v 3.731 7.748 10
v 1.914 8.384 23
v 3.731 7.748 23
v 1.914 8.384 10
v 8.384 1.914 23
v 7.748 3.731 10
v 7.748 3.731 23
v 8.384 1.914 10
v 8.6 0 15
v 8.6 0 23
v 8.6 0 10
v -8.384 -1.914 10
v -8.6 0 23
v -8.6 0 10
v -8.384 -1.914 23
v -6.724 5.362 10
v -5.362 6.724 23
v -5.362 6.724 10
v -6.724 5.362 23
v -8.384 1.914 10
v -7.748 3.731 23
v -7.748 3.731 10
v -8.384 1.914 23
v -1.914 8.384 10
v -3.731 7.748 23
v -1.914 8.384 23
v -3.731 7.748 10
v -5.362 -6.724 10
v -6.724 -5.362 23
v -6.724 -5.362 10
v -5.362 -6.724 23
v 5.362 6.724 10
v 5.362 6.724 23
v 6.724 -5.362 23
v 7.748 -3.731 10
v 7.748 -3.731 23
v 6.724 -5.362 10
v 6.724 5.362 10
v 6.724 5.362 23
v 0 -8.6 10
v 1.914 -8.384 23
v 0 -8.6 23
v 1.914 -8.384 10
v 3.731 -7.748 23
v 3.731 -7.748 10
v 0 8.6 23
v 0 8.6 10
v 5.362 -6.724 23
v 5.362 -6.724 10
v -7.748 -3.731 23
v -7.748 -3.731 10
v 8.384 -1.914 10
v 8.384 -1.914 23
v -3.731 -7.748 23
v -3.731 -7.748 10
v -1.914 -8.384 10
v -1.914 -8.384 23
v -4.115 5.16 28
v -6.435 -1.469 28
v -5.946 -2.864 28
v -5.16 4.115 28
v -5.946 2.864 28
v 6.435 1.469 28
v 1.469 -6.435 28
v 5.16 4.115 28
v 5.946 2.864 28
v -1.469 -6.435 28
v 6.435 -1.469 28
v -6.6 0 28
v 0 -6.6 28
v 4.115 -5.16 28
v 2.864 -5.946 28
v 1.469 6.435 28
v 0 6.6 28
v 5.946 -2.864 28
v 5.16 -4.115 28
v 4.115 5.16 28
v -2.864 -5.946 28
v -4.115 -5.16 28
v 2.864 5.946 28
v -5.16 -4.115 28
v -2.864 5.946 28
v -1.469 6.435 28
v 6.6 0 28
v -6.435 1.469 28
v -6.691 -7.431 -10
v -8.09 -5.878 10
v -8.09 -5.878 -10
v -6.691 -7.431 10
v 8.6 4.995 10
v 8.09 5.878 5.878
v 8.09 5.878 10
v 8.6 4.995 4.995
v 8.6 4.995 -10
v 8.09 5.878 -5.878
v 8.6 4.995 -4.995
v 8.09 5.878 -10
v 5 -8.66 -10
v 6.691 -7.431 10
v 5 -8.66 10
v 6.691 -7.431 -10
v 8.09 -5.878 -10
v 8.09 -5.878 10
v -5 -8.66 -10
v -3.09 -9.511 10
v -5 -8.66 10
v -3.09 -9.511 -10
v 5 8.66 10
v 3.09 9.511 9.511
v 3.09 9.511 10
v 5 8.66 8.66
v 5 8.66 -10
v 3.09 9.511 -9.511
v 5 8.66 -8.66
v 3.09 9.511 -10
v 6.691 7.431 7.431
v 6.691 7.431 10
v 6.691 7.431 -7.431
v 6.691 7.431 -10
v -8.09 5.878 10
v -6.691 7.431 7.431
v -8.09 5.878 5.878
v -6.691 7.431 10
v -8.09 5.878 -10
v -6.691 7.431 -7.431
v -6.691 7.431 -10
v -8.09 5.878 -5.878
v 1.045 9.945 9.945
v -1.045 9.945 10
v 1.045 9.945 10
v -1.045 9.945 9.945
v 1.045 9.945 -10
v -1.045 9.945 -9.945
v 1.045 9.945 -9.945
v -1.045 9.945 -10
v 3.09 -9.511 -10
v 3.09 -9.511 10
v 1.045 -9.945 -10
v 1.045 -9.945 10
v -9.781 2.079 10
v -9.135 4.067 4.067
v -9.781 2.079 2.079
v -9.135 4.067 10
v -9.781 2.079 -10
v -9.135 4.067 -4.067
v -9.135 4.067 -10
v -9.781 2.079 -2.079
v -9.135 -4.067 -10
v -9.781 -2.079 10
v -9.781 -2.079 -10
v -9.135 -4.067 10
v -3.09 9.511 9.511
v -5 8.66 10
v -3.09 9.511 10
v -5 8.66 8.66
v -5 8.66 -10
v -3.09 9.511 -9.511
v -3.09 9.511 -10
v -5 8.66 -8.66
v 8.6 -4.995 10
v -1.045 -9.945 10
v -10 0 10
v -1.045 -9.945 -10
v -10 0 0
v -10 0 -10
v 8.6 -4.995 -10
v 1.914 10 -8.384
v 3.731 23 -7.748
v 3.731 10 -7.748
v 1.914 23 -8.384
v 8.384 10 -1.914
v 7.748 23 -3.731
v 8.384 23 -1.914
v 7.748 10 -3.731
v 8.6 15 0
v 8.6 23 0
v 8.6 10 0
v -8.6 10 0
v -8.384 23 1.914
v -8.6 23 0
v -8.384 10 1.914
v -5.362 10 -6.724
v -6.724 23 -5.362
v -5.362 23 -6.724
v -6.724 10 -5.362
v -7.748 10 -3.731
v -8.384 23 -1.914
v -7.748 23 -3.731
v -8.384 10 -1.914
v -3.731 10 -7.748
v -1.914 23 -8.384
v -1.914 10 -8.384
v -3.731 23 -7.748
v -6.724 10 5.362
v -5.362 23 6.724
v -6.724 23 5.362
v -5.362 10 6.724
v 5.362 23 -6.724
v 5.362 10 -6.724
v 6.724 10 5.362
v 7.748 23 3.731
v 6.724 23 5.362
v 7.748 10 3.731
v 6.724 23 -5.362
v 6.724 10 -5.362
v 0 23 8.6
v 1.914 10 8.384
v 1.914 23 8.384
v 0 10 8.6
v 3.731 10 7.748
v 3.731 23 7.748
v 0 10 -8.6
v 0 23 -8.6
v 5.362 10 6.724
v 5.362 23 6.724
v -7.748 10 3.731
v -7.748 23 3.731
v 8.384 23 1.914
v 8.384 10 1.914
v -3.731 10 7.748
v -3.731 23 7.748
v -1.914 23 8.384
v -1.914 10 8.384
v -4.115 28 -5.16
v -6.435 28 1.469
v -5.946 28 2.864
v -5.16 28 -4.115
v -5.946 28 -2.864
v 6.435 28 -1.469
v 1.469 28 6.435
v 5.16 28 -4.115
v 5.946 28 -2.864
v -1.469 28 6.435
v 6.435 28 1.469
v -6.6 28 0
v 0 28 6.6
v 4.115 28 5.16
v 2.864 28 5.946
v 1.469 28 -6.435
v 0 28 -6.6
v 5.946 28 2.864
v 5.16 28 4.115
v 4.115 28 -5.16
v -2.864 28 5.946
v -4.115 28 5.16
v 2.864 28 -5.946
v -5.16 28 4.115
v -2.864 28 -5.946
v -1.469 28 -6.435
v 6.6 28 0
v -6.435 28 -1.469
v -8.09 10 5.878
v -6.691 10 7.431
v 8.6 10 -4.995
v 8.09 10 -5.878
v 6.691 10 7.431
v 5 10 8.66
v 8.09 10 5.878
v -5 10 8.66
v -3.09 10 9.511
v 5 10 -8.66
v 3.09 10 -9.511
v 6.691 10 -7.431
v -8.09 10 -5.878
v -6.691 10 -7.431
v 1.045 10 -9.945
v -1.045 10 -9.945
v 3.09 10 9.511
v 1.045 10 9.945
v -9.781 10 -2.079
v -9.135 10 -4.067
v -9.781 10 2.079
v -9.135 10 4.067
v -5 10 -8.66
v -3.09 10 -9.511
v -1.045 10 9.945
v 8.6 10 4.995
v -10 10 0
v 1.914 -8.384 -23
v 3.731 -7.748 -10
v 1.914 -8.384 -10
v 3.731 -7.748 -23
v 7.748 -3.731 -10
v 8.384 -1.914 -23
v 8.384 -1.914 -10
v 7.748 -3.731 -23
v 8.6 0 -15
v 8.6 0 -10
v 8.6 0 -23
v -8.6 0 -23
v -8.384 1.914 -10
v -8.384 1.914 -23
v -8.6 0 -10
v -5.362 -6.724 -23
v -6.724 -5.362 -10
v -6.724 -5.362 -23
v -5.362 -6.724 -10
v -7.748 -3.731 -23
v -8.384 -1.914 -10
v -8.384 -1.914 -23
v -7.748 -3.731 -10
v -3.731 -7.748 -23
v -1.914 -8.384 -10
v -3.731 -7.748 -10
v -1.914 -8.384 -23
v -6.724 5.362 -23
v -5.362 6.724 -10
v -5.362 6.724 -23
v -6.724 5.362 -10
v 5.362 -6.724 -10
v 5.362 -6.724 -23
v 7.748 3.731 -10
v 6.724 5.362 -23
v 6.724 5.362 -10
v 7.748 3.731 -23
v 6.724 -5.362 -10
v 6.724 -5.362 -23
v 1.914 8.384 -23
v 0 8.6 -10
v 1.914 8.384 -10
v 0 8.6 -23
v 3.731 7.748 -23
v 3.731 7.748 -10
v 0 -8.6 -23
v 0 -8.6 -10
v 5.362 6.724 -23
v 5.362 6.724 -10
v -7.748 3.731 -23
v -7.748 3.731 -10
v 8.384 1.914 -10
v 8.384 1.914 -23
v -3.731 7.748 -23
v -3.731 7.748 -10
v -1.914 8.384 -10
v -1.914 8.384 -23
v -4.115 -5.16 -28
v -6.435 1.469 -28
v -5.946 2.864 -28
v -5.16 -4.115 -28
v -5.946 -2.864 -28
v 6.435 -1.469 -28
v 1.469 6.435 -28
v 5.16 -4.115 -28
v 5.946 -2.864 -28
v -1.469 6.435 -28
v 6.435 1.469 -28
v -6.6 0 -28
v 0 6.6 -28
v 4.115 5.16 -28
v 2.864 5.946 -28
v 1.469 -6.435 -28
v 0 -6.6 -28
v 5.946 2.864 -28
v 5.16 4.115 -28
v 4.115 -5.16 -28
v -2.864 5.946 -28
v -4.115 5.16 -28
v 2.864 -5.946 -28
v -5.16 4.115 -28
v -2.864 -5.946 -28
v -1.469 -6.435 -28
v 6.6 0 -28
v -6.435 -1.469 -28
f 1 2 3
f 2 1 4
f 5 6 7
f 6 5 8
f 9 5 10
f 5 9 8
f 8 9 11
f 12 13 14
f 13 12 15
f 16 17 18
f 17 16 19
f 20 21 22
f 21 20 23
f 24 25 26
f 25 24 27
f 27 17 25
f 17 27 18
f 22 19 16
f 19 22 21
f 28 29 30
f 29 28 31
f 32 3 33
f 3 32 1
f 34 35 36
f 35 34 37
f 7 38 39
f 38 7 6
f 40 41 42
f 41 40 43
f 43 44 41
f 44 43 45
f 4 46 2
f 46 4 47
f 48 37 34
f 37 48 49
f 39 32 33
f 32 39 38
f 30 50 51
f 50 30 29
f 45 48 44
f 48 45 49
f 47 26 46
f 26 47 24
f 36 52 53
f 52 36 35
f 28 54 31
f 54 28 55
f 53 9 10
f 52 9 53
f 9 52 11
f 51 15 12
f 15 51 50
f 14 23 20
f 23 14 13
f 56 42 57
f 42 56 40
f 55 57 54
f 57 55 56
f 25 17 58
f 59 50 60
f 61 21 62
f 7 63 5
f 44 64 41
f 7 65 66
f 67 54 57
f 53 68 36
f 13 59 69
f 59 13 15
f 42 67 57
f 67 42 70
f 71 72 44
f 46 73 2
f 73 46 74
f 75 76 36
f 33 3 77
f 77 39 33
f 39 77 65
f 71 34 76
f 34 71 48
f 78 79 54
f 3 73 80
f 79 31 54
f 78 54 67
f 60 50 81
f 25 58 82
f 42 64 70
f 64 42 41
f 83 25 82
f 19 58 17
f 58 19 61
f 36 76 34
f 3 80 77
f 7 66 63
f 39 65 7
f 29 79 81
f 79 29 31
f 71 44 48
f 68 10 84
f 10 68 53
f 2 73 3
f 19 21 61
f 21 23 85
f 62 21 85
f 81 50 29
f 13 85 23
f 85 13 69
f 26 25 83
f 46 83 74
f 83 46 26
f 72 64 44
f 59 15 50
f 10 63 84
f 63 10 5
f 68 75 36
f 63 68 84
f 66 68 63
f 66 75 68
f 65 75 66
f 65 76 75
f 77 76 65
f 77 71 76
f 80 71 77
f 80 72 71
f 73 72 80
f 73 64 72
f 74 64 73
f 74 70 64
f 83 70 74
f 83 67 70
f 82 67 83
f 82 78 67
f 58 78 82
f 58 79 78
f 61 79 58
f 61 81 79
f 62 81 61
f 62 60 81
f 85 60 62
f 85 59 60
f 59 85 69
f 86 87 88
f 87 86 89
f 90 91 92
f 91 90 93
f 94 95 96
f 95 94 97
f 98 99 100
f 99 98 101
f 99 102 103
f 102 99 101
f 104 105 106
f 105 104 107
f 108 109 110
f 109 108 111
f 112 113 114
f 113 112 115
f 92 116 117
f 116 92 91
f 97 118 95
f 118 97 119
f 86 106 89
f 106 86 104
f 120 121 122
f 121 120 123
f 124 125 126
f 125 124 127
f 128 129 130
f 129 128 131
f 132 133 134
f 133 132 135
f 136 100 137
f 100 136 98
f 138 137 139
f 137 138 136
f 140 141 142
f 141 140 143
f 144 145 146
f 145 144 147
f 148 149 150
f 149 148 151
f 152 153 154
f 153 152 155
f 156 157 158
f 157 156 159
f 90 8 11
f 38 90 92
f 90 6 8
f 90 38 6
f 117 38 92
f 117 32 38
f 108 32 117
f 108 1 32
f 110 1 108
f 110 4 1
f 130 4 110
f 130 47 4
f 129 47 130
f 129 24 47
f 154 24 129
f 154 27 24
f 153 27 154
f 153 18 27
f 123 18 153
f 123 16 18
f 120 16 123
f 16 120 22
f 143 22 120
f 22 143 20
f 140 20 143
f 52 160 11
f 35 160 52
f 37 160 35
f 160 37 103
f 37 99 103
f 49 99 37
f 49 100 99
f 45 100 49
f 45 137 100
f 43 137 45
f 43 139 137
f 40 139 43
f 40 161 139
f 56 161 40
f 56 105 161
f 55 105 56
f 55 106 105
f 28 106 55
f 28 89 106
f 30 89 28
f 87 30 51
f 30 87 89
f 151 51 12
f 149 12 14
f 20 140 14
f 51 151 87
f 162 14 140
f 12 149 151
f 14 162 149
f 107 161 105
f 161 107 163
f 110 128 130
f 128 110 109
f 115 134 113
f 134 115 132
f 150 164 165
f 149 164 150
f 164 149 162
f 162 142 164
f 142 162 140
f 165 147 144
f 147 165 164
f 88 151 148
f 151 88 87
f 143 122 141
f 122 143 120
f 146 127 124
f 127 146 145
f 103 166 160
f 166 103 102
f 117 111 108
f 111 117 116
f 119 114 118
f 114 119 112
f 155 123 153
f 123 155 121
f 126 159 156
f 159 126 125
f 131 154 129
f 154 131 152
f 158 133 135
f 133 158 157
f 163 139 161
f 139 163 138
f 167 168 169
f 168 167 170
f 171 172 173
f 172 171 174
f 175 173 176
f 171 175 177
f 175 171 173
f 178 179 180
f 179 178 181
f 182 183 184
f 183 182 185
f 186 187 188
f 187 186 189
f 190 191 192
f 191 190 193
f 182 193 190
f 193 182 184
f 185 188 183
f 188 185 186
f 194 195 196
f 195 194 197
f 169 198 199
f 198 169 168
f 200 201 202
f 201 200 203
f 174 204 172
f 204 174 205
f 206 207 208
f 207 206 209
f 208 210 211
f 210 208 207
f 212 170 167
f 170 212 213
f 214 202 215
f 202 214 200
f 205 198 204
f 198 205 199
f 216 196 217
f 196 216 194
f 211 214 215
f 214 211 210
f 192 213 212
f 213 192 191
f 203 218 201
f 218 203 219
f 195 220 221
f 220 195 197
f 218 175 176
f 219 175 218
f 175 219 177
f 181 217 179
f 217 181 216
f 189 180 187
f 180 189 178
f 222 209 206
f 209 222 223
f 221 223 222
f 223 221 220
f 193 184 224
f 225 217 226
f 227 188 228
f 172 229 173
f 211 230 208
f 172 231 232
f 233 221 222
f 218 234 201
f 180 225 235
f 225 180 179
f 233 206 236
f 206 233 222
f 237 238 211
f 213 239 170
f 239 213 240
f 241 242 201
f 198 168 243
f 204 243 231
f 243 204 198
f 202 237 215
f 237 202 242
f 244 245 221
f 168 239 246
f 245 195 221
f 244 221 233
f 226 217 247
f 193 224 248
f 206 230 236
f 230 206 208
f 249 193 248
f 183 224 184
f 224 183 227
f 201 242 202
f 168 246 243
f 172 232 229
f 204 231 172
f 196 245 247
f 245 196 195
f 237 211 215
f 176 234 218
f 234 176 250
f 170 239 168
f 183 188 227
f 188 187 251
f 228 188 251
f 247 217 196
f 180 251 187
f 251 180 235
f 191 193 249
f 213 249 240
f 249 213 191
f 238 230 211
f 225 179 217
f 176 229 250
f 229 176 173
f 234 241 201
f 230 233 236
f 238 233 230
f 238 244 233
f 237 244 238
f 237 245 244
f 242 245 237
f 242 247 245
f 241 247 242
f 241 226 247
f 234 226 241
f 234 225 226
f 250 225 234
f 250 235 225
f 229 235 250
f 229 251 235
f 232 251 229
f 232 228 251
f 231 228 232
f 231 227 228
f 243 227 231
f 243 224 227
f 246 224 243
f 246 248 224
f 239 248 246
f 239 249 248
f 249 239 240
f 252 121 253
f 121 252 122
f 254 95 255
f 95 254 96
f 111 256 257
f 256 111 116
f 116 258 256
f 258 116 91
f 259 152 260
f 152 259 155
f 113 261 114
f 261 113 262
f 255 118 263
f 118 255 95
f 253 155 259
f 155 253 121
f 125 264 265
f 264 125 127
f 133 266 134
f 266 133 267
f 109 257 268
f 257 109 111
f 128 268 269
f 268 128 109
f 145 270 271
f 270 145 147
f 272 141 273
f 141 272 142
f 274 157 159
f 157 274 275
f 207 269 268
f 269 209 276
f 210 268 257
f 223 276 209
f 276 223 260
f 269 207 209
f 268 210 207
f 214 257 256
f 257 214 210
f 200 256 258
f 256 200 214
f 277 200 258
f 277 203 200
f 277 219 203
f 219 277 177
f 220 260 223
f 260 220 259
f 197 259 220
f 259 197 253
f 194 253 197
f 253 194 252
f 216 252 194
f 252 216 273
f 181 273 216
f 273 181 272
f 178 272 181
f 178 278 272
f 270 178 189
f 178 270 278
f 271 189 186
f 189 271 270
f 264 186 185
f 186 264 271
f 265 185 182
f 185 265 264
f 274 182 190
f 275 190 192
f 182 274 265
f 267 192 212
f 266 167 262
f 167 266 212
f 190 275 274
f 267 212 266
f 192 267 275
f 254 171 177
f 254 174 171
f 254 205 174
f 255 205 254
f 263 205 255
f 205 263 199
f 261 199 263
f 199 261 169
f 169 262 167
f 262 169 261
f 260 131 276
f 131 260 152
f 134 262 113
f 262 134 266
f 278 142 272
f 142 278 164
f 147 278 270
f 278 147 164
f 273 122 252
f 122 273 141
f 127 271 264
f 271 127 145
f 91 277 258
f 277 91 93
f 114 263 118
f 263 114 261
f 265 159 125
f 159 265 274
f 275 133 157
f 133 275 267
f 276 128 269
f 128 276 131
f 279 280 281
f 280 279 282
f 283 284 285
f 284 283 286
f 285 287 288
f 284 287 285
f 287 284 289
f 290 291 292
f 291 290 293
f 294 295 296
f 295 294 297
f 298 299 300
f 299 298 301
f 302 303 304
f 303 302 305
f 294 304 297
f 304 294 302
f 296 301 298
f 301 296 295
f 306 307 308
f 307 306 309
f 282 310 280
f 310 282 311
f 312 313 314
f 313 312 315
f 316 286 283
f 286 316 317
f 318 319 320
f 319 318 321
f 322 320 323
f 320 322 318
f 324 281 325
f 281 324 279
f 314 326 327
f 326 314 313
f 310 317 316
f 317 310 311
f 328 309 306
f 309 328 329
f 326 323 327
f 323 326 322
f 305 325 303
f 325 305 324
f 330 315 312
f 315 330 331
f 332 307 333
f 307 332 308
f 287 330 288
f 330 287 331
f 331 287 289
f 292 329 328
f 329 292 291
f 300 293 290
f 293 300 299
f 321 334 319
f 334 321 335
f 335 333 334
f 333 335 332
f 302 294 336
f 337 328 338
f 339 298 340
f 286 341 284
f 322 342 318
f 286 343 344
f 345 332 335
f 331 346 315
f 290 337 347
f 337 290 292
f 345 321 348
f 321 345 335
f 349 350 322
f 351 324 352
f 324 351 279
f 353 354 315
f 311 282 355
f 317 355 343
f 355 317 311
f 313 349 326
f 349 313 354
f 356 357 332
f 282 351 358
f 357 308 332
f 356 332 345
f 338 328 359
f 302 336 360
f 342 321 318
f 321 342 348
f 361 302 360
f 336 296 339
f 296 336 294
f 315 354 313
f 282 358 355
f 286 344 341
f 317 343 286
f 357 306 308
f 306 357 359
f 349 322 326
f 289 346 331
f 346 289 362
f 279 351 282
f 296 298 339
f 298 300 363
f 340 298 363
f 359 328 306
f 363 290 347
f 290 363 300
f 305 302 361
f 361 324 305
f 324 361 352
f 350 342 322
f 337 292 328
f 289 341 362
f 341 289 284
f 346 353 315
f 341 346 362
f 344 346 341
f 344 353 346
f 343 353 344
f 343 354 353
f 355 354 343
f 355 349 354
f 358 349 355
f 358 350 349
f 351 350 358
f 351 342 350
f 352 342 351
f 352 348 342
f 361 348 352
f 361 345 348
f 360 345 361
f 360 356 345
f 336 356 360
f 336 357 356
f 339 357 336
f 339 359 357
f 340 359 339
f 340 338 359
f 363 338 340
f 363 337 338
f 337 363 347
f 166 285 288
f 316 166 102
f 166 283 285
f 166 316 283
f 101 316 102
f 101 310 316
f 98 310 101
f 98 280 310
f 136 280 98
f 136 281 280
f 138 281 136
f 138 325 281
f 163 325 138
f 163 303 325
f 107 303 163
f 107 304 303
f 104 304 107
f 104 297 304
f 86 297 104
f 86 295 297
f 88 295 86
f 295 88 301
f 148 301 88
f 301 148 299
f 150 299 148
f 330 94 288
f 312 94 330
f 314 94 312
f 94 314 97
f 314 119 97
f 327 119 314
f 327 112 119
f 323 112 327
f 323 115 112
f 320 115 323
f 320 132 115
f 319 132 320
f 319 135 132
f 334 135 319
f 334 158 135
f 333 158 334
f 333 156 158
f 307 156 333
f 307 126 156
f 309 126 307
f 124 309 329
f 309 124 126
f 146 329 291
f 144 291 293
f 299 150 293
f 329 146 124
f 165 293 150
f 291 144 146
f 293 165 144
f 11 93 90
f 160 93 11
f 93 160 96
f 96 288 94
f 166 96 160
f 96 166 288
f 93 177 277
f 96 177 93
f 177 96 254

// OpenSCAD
/* [Parameters] */
Plugs = 3; // [2:5]
Outer_Diameter = 20;
Inner_Diameter = 17.2;
Angle1 = 180; // [0,45,72,90,135,180]
Angle2 = 90; // [0,45,72,90,135,180]

/* [Hidden] */
Inner_Radius = Inner_Diameter / 2; 
Outer_Radius = Outer_Diameter / 2;
taper = Inner_Radius - 2;
CutBox = Inner_Radius + 5;
InvCutBox = CutBox - (CutBox + CutBox);

GenPart(Outer_Diameter, Inner_Diameter, Plugs, Angle1, Angle2, Inner_Radius, Outer_Radius, taper, CutBox, InvCutBox);

module plug(OR, IR, TPR) {
  union(){
    cylinder(r1=IR, r2=IR, h=23, center=false);
    translate([0, 0, 23]){
      cylinder(r1=IR, r2=TPR, h=5, center=false);
    }
    cylinder(r1=OR, r2=OR, h=10, center=false);
  }
}

module my_135_endcap() {
  rotate([45, 0, 0]){
    translate([0, 0, 20]){
      cylinder(r1=10, r2=10, h=10, center=false);
    }
  }
}

module GenPart(OD, ID, P, A1, A2, IR, OR, TPR, CB, ICB) {
  if (P == 2) {
    if (A1 == 45) {
      my_2_way_45(OR, IR, TPR, CB);
    } else if (A1 == 0 || A2 == 180) {
      my_2_way_0_elbow2(OR, IR, TPR, CB);
    } else if (A1 == 135) {
      my_2_way_135_elbow(OR, IR, TPR, CB);
    } else if (A1 == 90) {
      my_2_way_90_elbow(OR, IR, TPR, ICB);
    }

  } else if (P == 3) {
    if (A1 == 90 && A2 == 90) {
      my_3_way_corner(OR, IR, TPR, CB);
    } else if (A1 == 45 && A2 == 90 || A1 == 90 && A2 == 45) {
      my_3_way_1_45(OR, IR, TPR, ICB);
    } else if (A1 == 90 && A2 == 135 || A1 == 135 && A2 == 90) {
      my_3_way_corner_135(OR, IR, TPR, CB);
    } else if (A1 == 120 && A2 == 120) {
      my_3_way_Star(OR, IR, TPR, CB);
    } else if (A1 == 90 && A2 == 180 || A1 == 180 && A2 == 90) {
      my_3_way_0_90_180_elbow(OR, IR, TPR, CB);
    }

  } else if (P == 4) {
    if (A1 == 90 && A2 == 90) {
      my_4_way_corner(OR, IR, TPR, CB);
    } else if (A1 == 90 && A2 == 180 || A1 == 180 && A2 == 90) {
      my_4_way_flat(OR, IR, TPR, CB);
    }

  } else if (P == 5) {
    if (A1 == 90 && A2 == 90) {
      my_5_way(OR, IR, TPR, CB);
    } else if (A1 == 72 && A2 == 0 || A1 == 0 && A2 == 72) {
      my_5_way_star(OR, IR, TPR, CB);
    }

  }

}

module my_135_Endcapped_Both() {
  union(){
    rotate([0, 90, 0]){
      translate([20, 0, 0]){
        my_135_endcapped_2();
      }
    }
    translate([50, 0, 0]){
      rotate([0, 270, 0]){
        translate([-20, 0, 0]){
          mirror([1,0,0]){
            my_135_endcapped_2();
          }
        }
      }
    }
  }
}

module my_135_endcapped_2() {
  difference() {
    union(){
      rotate([270, 0, 0]){
        translate([0, 0, 25]){
          // torus
          rotate_extrude($fn=32) {
            translate([Outer_Radius, 0, 0]) {
              circle(r=5, $fn=32);
            }
          }
        }
      }
      rotate([90, 0, 0]){
        translate([0, 0, -8]){
          // torus
          rotate_extrude($fn=32) {
            translate([Outer_Radius, 0, 0]) {
              circle(r=4, $fn=32);
            }
          }
        }
      }
      my_2_way_135_elbow(null, null, null, null);
    }

    translate([CutBox, 0, 0]){
      cube([10, 60, 60], center=true);
    }
  }
}

module my_2_way_135_capped() {
  difference() {
    union(){
      rotate([45, 0, 0]){
        plug(null, null, null);
      }
      rotate([270, 0, 0]){
        plug(null, null, null);
      }
      sphere(r=10);
      my_135_endcap();
    }

    translate([13.45, 0, 0]){
      cube([10, 50, 50], center=true);
    }
    translate([-13.45, 0, 0]){
      cube([10, 50, 50], center=true);
    }
  }
}

module my_2_way_45(OR, IR, TPR, CB) {
  difference() {
    union(){
      rotate([0, 0, 0]){
        translate([0, 0, 15]){
          plug(OR, IR, TPR);
        }
        cylinder(r1=OR, r2=OR, h=20, center=false);
      }
      rotate([45, 0, 0]){
        translate([0, 0, 15]){
          plug(OR, IR, TPR);
        }
        cylinder(r1=OR, r2=OR, h=20, center=false);
      }
      sphere(r=OR);
    }

    translate([CB, 0, 0]){
      cube([10, 50, 50], center=true);
    }
  }
}

module my_5_way(OR, IR, TPR, CB) {
  difference() {
    union(){
      rotate([0, 0, 0]){
        plug(OR, IR, TPR);
      }
      rotate([270, 0, 0]){
        plug(OR, IR, TPR);
      }
      rotate([180, 0, 0]){
        plug(OR, IR, TPR);
      }
      rotate([90, 0, 0]){
        plug(OR, IR, TPR);
      }
      rotate([180, 90, 0]){
        plug(OR, IR, TPR);
      }
      sphere(r=OR);
    }

    translate([CB, 0, 0]){
      cube([10, 30, 30], center=true);
    }
  }
}

module my_2_way_0_elbow2(OR, IR, TPR, CB) {
  difference() {
    union(){
      translate([0, 5, 0]){
        rotate([90, 0, 0]){
          plug(OR, IR, TPR);
        }
      }
      translate([0, -5, 0]){
        rotate([270, 0, 0]){
          plug(OR, IR, TPR);
        }
      }
      sphere(r=OR);
    }

    translate([CB, 0, 0]){
      cube([10, 30, 30], center=true);
    }
  }
}

module my_2_way_90_elbow(OR, IR, TPR, ICB) {
  difference() {
    union(){
      rotate([180, 0, 0]){
        plug(OR, IR, TPR);
      }
      rotate([270, 0, 0]){
        plug(OR, IR, TPR);
      }
      sphere(r=OR);
    }

    translate([ICB, 0, 0]){
      cube([10, 30, 30], center=true);
    }
  }
}

module my_2_way_135_elbow(OR, IR, TPR, CB) {
  difference() {
    union(){
      rotate([45, 0, 0]){
        plug(OR, IR, TPR);
      }
      rotate([270, 0, 0]){
        plug(OR, IR, TPR);
      }
      sphere(r=OR);
    }

    translate([CB, 0, 0]){
      cube([10, 30, 30], center=true);
    }
  }
}

module my_3_way_corner(OR, IR, TPR, CB) {
  difference() {
    union(){
      rotate([180, 90, 0]){
        plug(OR, IR, TPR);
      }
      rotate([270, 0, 0]){
        plug(OR, IR, TPR);
      }
      rotate([180, 0, 0]){
        plug(OR, IR, TPR);
      }
      sphere(r=OR);
    }

    translate([CB, 0, 0]){
      cube([10, 30, 30], center=true);
    }
  }
}

module my_3_way_1_45(OR, IR, TPR, ICB) {
  difference() {
    union(){
      rotate([0, 0, 0]){
        translate([0, 0, 15]){
          plug(OR, IR, TPR);
        }
        cylinder(r1=OR, r2=OR, h=20, center=false);
      }
      rotate([45, 0, 0]){
        translate([0, 0, 15]){
          plug(OR, IR, TPR);
        }
        cylinder(r1=OR, r2=OR, h=20, center=false);
      }
      rotate([90, 0, 90]){
        translate([0, 0, 15]){
          plug(OR, IR, TPR);
        }
        cylinder(r1=OR, r2=OR, h=20, center=false);
      }
      sphere(r=OR);
    }

    translate([ICB, 0, 0]){
      cube([10, 50, 50], center=true);
    }
  }
}

module my_3_way_corner_135(OR, IR, TPR, CB) {
  difference() {
    union(){
      rotate([135, 90, 0]){
        plug(OR, IR, TPR);
      }
      rotate([270, 0, 0]){
        plug(OR, IR, TPR);
      }
      rotate([180, 0, 0]){
        plug(OR, IR, TPR);
      }
      sphere(r=OR);
    }

    rotate([0, 270, 0]){
      translate([CB, 0, 0]){
        cube([10, 30, 30], center=true);
      }
    }
  }
}

module my_3_way_Star(OR, IR, TPR, CB) {
  difference() {
    union(){
      rotate([0, 0, 0]){
        plug(OR, IR, TPR);
      }
      rotate([120, 0, 0]){
        plug(OR, IR, TPR);
      }
      sphere(r=10);
      rotate([240, 0, 0]){
        plug(OR, IR, TPR);
      }
    }

    translate([CB, 0, 0]){
      cube([10, 30, 30], center=true);
    }
  }
}

module my_3_way_0_90_180_elbow(OR, IR, TPR, CB) {
  difference() {
    union(){
      rotate([0, 0, 0]){
        plug(OR, IR, TPR);
      }
      rotate([270, 0, 0]){
        plug(OR, IR, TPR);
      }
      rotate([180, 0, 0]){
        plug(OR, IR, TPR);
      }
      sphere(r=OR);
    }

    translate([CB, 0, 0]){
      cube([10, 30, 30], center=true);
    }
  }
}

module my_4_way_corner(OR, IR, TPR, CB) {
  difference() {
    union(){
      rotate([0, 0, 0]){
        plug(OR, IR, TPR);
      }
      rotate([270, 0, 0]){
        plug(OR, IR, TPR);
      }
      rotate([180, 0, 0]){
        plug(OR, IR, TPR);
      }
      rotate([180, 90, 0]){
        plug(OR, IR, TPR);
      }
      sphere(r=OR);
    }

    translate([CB, 0, 0]){
      cube([10, 30, 30], center=true);
    }
  }
}

module my_4_way_flat(OR, IR, TPR, CB) {
  difference() {
    union(){
      rotate([0, 0, 0]){
        plug(OR, IR, TPR);
      }
      rotate([270, 0, 0]){
        plug(OR, IR, TPR);
      }
      rotate([180, 0, 0]){
        plug(OR, IR, TPR);
      }
      rotate([90, 0, 0]){
        plug(OR, IR, TPR);
      }
      sphere(r=OR);
    }

    translate([CB, 0, 0]){
      cube([10, 30, 30], center=true);
    }
  }
}

module my_5_way_star(OR, IR, TPR, CB) {
  difference() {
    union(){
      rotate([0, 0, 0]){
        translate([0, 0, 5]){
          plug(OR, IR, TPR);
        }
        cylinder(r1=OR, r2=10, h=15, center=false);
      }
      rotate([72, 0, 0]){
        translate([0, 0, 5]){
          plug(OR, IR, TPR);
        }
        cylinder(r1=OR, r2=10, h=15, center=false);
      }
      sphere(r=OR);
      rotate([144, 0, 0]){
        translate([0, 0, 5]){
          plug(OR, IR, TPR);
        }
        cylinder(r1=OR, r2=OR, h=15, center=false);
      }
      rotate([216, 0, 0]){
        translate([0, 0, 5]){
          plug(OR, IR, TPR);
        }
        cylinder(r1=OR, r2=OR, h=15, center=false);
      }
      rotate([288, 0, 0]){
        translate([0, 0, 5]){
          plug(OR, IR, TPR);
        }
        cylinder(r1=OR, r2=OR, h=15, center=false);
      }
    }

    translate([CB, 0, 0]){
      cube([10, 50, 50], center=true);
    }
  }
}
